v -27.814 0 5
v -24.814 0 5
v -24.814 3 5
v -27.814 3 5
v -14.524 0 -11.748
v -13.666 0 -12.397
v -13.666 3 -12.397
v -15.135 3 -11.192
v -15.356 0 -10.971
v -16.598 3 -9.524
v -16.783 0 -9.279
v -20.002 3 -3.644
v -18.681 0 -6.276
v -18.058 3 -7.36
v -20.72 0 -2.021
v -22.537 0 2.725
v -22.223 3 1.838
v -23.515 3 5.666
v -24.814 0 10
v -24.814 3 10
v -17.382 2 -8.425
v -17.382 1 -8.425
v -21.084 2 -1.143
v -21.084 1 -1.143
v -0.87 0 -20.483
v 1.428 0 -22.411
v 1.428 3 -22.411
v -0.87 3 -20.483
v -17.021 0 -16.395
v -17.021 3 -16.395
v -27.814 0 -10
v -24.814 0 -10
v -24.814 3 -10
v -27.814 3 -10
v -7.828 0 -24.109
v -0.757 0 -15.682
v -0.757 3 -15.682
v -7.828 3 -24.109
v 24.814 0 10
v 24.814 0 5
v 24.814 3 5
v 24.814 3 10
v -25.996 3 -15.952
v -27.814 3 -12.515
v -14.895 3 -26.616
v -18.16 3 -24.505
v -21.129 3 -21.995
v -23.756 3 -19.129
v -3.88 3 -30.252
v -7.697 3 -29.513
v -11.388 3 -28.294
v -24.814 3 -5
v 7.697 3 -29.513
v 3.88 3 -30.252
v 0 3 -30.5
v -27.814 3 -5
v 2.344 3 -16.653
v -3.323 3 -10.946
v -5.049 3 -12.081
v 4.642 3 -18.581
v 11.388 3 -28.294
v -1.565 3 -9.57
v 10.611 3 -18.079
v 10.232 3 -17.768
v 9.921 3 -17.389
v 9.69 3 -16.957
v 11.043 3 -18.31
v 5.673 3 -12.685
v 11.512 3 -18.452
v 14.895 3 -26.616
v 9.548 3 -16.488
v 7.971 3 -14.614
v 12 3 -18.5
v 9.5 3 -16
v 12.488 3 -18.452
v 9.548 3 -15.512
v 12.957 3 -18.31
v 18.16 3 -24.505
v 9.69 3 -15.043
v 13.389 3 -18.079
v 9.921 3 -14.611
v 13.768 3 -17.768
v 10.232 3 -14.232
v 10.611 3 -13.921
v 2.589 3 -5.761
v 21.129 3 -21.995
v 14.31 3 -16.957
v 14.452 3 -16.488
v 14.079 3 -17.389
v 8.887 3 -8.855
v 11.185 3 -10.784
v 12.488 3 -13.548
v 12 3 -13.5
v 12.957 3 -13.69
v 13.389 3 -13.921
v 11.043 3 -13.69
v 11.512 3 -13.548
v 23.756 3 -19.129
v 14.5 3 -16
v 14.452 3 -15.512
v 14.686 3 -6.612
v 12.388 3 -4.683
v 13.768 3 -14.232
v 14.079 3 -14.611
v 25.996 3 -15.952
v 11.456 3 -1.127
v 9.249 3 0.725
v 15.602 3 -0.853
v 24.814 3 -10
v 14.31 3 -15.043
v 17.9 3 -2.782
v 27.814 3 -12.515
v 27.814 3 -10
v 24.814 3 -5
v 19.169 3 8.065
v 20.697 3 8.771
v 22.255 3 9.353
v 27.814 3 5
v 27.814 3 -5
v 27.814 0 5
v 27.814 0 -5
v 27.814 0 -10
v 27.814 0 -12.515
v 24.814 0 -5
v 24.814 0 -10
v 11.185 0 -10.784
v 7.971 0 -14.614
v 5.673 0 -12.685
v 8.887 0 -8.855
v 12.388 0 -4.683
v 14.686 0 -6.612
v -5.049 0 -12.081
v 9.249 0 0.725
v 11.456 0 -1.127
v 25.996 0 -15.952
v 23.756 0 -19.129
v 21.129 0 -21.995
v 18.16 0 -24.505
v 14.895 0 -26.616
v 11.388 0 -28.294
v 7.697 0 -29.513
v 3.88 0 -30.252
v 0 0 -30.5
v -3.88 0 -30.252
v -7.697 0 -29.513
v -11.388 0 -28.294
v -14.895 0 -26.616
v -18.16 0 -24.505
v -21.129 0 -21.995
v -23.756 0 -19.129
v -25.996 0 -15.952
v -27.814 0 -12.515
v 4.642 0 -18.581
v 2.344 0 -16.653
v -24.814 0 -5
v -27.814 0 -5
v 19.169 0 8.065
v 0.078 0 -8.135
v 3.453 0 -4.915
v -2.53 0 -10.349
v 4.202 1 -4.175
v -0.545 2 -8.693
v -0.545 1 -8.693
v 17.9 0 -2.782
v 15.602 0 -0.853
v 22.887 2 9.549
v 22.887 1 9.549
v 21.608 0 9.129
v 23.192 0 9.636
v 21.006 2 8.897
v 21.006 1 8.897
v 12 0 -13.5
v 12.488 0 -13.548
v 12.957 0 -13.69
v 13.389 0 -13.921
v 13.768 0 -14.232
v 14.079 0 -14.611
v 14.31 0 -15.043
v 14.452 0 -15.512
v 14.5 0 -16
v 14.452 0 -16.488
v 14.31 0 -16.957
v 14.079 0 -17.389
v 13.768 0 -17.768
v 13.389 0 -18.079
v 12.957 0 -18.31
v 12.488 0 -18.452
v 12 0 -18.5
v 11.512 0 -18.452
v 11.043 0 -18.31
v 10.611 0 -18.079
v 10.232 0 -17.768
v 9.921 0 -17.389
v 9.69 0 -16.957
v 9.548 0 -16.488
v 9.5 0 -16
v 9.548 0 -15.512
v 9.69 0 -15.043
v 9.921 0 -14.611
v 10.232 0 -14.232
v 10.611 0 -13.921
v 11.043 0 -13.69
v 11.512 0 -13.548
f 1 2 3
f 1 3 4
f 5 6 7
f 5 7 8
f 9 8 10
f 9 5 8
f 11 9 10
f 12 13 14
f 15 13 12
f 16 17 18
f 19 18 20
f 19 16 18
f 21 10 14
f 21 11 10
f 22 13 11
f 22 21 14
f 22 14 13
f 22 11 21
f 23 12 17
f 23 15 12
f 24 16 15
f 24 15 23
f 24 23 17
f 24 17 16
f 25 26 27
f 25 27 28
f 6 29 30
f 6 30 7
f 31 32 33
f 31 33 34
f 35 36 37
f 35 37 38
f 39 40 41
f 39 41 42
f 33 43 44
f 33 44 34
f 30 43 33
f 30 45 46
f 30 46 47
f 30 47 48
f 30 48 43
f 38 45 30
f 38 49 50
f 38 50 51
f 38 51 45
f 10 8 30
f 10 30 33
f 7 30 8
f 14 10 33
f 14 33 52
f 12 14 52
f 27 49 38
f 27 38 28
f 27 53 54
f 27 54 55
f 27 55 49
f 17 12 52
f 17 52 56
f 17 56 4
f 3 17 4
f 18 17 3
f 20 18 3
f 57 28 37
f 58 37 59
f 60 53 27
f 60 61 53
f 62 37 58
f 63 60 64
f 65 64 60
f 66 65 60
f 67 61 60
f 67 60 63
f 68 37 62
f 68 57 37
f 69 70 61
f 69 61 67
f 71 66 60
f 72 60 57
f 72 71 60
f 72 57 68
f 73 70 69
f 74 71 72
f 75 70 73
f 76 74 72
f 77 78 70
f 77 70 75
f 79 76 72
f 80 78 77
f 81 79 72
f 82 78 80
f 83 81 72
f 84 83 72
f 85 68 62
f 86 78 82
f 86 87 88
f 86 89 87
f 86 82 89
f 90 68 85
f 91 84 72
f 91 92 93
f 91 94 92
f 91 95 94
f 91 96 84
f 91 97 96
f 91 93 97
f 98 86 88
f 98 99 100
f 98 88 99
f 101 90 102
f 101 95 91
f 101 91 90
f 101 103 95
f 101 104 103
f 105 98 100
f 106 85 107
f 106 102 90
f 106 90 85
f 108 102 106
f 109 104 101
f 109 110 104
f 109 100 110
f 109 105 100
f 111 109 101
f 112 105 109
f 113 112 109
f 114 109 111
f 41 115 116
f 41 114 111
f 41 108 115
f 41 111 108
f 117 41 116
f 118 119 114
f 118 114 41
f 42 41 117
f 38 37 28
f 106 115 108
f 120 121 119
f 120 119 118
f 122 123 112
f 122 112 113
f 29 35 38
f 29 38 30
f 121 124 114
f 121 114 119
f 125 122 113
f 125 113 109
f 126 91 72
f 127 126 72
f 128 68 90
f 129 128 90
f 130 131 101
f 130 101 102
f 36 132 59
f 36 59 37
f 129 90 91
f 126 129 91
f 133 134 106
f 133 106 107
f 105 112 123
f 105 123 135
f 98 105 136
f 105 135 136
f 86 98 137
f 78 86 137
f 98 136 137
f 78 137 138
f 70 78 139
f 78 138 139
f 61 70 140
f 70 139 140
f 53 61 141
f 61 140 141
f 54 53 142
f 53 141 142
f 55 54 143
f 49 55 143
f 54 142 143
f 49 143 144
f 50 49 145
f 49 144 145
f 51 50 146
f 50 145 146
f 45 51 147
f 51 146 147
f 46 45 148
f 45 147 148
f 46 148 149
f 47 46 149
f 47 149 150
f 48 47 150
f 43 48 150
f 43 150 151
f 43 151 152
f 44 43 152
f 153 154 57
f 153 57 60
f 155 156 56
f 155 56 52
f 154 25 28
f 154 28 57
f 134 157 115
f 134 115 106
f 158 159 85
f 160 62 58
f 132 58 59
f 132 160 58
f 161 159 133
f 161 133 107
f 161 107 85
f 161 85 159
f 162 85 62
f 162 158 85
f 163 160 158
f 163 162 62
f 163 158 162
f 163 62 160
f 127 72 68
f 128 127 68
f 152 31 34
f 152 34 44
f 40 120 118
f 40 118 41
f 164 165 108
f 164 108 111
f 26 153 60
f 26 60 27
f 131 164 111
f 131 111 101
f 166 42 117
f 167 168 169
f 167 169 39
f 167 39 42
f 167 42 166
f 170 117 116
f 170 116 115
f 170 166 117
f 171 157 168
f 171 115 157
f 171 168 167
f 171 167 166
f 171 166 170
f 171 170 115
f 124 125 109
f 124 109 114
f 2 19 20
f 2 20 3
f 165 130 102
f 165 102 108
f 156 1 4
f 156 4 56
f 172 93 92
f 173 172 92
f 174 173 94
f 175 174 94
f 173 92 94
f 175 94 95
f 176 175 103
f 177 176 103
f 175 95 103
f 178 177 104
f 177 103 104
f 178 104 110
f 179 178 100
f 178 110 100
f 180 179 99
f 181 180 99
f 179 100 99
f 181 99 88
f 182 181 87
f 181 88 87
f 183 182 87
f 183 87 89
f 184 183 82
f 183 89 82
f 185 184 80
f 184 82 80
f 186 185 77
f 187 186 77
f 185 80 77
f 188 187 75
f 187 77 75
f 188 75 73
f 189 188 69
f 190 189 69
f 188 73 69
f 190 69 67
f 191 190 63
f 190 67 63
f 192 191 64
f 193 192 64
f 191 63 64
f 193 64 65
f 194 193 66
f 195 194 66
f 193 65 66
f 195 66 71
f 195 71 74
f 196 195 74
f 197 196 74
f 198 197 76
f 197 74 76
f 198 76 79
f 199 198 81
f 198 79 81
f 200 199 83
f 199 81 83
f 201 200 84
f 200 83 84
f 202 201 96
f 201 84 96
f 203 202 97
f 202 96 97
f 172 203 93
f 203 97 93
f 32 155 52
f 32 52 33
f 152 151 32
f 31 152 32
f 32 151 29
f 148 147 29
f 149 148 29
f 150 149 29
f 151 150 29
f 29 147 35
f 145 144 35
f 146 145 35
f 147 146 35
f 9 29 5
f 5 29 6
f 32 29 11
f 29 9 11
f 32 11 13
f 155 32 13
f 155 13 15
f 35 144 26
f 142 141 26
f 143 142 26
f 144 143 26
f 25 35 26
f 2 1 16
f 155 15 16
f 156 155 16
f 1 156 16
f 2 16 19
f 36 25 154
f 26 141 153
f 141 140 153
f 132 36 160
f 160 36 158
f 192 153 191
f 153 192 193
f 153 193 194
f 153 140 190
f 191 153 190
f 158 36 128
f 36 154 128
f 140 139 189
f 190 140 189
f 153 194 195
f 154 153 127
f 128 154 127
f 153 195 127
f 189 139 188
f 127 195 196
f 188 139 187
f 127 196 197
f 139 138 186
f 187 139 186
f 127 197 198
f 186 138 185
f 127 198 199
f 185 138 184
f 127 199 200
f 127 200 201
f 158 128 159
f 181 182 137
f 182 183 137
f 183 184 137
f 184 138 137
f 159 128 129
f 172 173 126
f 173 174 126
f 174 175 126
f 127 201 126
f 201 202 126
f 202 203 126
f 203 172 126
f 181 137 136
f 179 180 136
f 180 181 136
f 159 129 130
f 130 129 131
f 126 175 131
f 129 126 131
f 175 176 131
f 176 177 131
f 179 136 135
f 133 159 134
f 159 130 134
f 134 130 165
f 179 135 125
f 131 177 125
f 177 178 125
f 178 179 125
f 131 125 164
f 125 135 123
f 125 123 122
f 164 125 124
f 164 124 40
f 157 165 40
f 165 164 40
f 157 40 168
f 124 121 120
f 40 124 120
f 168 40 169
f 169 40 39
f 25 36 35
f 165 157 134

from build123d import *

# Parameters (mm, degrees)
CROQUIS1_R                 = 30.5
SALIENTE_EXTRUIR1_DEPTH    = 3
CROQUIS2_R                 = 2
CORTAR_EXTRUIR1_DEPTH      = 4
CORTAR_EXTRUIR3_START      = -4
CORTAR_EXTRUIR3_DEPTH      = 4
CORTAR_EXTRUIR5_START      = -4
CORTAR_EXTRUIR5_DEPTH      = 4
CORTAR_EXTRUIR6_DEPTH      = 10
CROQUIS10_R                = 2.5
CORTAR_EXTRUIR7_DEPTH      = 3
CORTAR_EXTRUIR8_DEPTH      = 44.237715166
CORTAR_EXTRUIR8_DEPTH_BACK = 44.237715166


with BuildPart() as part:
    # Croquis1 → Saliente-Extruir1 (new body)
    with BuildSketch(Plane(origin=(0, 0, 0), x_dir=(1, 0, 0), z_dir=(0, 1, 0))):
        with Locations(Location((0, 0, 0), (0, 0, 270))):
            Circle(CROQUIS1_R)
    extrude(amount=SALIENTE_EXTRUIR1_DEPTH)

    # Croquis2 → Cortar-Extruir1 (cut)
    with BuildSketch(Plane(origin=(0, 3, 0), x_dir=(1, 0, 0), z_dir=(0, 1, 0))):
        with Locations(Location((0, 0, 0), (0, 0, 270))):
            Circle(CROQUIS2_R)
    extrude(amount=-CORTAR_EXTRUIR1_DEPTH, mode=Mode.SUBTRACT)

    # Croquis5 → Cortar-Extruir3 (cut)
    with BuildSketch(Plane(origin=(0, 3, 0), x_dir=(1, 0, 0), z_dir=(0, 1, 0)).offset(CORTAR_EXTRUIR3_START)):
        with BuildLine():
            Line((28.814059068, 5), (30.087372767, 5))
            ThreePointArc((30.087372767, 5), (29.556634924, 7.526973624), (28.814059068, 10))
            Line((28.814059068, 10), (24.814059068, 10))
            Line((24.814059068, 10), (24.814059068, 5))
            Line((24.814059068, 5), (28.814059068, 5))
        make_face()
        with BuildLine():
            Line((30.087372767, -5), (28.814059068, -5))
            Line((28.814059068, -5), (24.814059068, -5))
            Line((24.814059068, -5), (24.814059068, -10))
            Line((24.814059068, -10), (28.814059068, -10))
            ThreePointArc((28.814059068, -10), (29.556634924, -7.526973624), (30.087372767, -5))
        make_face()
        with BuildLine():
            Line((-24.814059068, 5), (-24.814059068, 10))
            Line((-24.814059068, 10), (-28.814059068, 10))
            ThreePointArc((-28.814059068, 10), (-29.556634924, 7.526973624), (-30.087372767, 5))
            Line((-30.087372767, 5), (-28.814059068, 5))
            Line((-28.814059068, 5), (-24.814059068, 5))
        make_face()
        with BuildLine():
            Line((-28.814059068, -10), (-24.814059068, -10))
            Line((-24.814059068, -10), (-24.814059068, -5))
            Line((-24.814059068, -5), (-28.814059068, -5))
            Line((-28.814059068, -5), (-30.087372767, -5))
            ThreePointArc((-30.087372767, -5), (-29.556634924, -7.526973624), (-28.814059068, -10))
        make_face()
    extrude(amount=CORTAR_EXTRUIR3_DEPTH, mode=Mode.SUBTRACT)

    # Croquis7 → Cortar-Extruir5 (cut)
    with BuildSketch(Plane(origin=(0, 3, 0), x_dir=(1, 0, 0), z_dir=(0, 1, 0)).offset(CORTAR_EXTRUIR5_START)):
        Polygon((1.428390211, 22.411430151), (-0.869743118, 20.483067322), (2.34419493, 16.652845106), (4.642328259, 18.581207935), align=None)
        with BuildLine():
            Line((-24.814059068, -10), (-28.814059068, -10))
            ThreePointArc((-28.814059068, -10), (0, -30.5), (28.814059068, -10))
            Line((28.814059068, -10), (24.814059068, -10))
            add(Edge.make_bspline(
                [(24.814059068, -10), (22.863263717, -9.657344338), (20.984021298, -8.980450277), (19.168992989, -8.065339906)],
                knots=[0, 0, 0, 0, 0.087850084, 0.087850084, 0.087850084, 0.087850084], degree=3))
            Line((19.168992989, -8.065339906), (11.455541673, 1.127193412))
            Line((11.455541673, 1.127193412), (9.248678515, -0.72458465))
            add(Edge.make_bspline(
                [(9.248678515, -0.72458465), (4.033234859, 4.116641048), (-0.646914404, 9.508508747), (-5.04935939, 12.080675515)],
                knots=[0.258799312, 0.258799312, 0.258799312, 0.258799312, 0.546435258, 0.546435258, 0.546435258, 0.546435258], degree=3))
            Line((-5.04935939, 12.080675515), (-0.757422911, 15.682037831))
            Line((-0.757422911, 15.682037831), (-7.828086618, 24.108526705))
            Line((-7.828086618, 24.108526705), (-17.020619935, 16.395075389))
            Line((-17.020619935, 16.395075389), (-13.66601447, 12.397212273))
            add(Edge.make_bspline(
                [(-13.66601447, 12.397212273), (-17.403465693, 9.897923685), (-21.056529869, 3.255841362), (-24.814059068, -10)],
                knots=[0.740637404, 0.740637404, 0.740637404, 0.740637404, 1, 1, 1, 1], degree=3))
        make_face()
        Polygon((14.685884661, 6.611763511), (12.387751331, 4.683400682), (15.60168938, 0.853178467), (17.899822709, 2.781541296), align=None)
    extrude(amount=CORTAR_EXTRUIR5_DEPTH, mode=Mode.SUBTRACT)

    # Croquis9 → Cortar-Extruir6 (cut)
    with BuildSketch(Plane(origin=(0, 3, 0), x_dir=(1, 0, 0), z_dir=(0, 1, 0))):
        Polygon((7.971418181, 14.613753061), (5.673284852, 12.685390231), (8.887222901, 8.855168016), (11.18535623, 10.783530845), align=None)
    extrude(amount=-CORTAR_EXTRUIR6_DEPTH, mode=Mode.SUBTRACT)

    # Croquis10 → Cortar-Extruir7 (cut)
    with BuildSketch(Plane(origin=(0, 3, 0), x_dir=(1, 0, 0), z_dir=(0, 1, 0))):
        with Locations(Location((12, 16, 0), (0, 0, 270))):
            Circle(CROQUIS10_R)
    extrude(amount=-CORTAR_EXTRUIR7_DEPTH, mode=Mode.SUBTRACT)

    # Croquis11 → Cortar-Extruir8 (cut, two sides: drawn at the far end of the back side and taken through both)
    with BuildSketch(Plane(origin=(0, 3, 0), x_dir=(1, 0, 0), z_dir=(0, 1, 0)).offset(-CORTAR_EXTRUIR8_DEPTH_BACK)):
        with BuildLine():
            Line((30.087372767, 5), (27.814059068, 5))
            Line((27.814059068, 5), (27.814059068, -5))
            Line((27.814059068, -5), (30.087372767, -5))
            ThreePointArc((30.087372767, -5), (30.5, 0), (30.087372767, 5))
        make_face()
        with BuildLine():
            ThreePointArc((28.814059068, 10), (28.341972277, 11.268655974), (27.814059068, 12.515115586))
            Line((27.814059068, 12.515115586), (27.814059068, 10))
            Line((27.814059068, 10), (28.814059068, 10))
        make_face()
        with BuildLine():
            Line((-27.814059068, -5), (-27.814059068, 5))
            Line((-27.814059068, 5), (-30.087372767, 5))
            ThreePointArc((-30.087372767, 5), (-30.5, 0), (-30.087372767, -5))
            Line((-30.087372767, -5), (-27.814059068, -5))
        make_face()
        with BuildLine():
            Line((-28.814059068, 10), (-27.814059068, 10))
            Line((-27.814059068, 10), (-27.814059068, 12.515115586))
            ThreePointArc((-27.814059068, 12.515115586), (-28.341972277, 11.268655974), (-28.814059068, 10))
        make_face()
    extrude(amount=CORTAR_EXTRUIR8_DEPTH + CORTAR_EXTRUIR8_DEPTH_BACK, mode=Mode.SUBTRACT)


solid = part.part
